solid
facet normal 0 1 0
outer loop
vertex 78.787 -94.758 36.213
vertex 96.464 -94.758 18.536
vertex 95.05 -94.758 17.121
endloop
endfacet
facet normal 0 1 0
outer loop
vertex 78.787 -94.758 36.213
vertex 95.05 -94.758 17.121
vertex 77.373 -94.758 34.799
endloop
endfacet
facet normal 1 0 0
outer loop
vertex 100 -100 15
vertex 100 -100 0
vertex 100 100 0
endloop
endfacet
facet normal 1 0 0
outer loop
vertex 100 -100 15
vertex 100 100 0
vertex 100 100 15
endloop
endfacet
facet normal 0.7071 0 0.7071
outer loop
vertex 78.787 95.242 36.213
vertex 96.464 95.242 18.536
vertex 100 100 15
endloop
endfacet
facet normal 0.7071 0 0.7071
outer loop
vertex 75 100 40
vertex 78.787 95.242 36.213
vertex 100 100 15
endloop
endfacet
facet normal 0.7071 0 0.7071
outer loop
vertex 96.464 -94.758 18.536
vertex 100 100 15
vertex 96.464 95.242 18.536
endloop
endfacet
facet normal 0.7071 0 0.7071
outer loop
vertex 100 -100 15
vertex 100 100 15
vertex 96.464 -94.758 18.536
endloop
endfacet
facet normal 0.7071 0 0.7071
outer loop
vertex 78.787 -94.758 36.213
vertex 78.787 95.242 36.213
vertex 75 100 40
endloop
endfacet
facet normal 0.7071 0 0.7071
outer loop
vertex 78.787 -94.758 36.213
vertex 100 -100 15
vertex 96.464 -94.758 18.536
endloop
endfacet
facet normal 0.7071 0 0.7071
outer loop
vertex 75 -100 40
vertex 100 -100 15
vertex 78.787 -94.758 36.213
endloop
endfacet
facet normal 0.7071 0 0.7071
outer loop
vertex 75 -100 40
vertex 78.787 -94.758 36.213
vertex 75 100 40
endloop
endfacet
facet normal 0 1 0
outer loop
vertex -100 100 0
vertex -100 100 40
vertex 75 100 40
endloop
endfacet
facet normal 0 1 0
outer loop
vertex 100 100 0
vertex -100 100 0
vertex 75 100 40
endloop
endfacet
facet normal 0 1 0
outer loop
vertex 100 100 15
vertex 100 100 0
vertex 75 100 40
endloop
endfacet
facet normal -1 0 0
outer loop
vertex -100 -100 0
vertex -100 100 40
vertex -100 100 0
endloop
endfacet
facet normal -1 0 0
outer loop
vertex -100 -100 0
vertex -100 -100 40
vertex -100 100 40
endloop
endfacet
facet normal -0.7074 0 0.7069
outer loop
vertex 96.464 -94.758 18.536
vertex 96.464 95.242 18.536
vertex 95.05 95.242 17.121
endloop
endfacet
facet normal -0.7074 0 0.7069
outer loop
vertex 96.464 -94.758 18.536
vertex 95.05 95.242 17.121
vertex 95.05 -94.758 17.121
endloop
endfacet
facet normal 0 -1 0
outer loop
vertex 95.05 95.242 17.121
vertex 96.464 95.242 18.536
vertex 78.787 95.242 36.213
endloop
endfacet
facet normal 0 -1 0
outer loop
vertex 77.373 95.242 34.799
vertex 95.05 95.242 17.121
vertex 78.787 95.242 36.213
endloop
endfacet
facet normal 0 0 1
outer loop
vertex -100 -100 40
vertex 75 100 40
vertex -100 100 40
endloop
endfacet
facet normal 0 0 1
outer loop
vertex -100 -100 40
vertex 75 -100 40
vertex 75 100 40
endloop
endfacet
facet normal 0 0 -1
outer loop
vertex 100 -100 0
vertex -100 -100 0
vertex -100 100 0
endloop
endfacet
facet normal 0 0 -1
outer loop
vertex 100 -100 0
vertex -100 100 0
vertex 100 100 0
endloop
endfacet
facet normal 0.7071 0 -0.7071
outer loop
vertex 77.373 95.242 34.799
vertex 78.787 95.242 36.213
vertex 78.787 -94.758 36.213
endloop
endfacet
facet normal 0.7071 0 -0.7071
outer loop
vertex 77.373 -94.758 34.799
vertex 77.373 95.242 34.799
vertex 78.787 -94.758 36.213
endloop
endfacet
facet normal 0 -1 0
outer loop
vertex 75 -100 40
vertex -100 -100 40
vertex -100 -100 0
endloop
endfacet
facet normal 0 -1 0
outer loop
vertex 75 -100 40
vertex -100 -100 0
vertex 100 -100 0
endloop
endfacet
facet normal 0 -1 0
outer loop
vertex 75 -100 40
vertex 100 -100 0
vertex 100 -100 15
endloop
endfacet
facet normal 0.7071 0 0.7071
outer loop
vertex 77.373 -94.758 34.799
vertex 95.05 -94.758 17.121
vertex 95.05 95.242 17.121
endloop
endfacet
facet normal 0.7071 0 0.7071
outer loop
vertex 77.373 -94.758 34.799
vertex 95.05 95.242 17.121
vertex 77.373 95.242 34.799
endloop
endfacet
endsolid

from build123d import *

# Parameters (mm, degrees)
PAD_DEPTH    = 100
SKETCH001_W  = 25
SKETCH001_H  = 190
POCKET_DEPTH = 2


with BuildPart() as part:
    # Sketch → Pad (new body, symmetric)
    with BuildSketch(Plane.XZ):
        Polygon((-100, 40), (-100, 0), (100, 0), (100, 15), (75, 40), align=None)
    extrude(amount=PAD_DEPTH, both=True)

    # Sketch001 (on DatumPlane) → Pocket (cut)
    with BuildSketch(Plane(origin=(100, -100, 15), x_dir=(-0.707107, 0, 0.707107), z_dir=(0.707107, 0, 0.707107))):
        with Locations((17.5, -100.241764)):
            Rectangle(SKETCH001_W, SKETCH001_H)
    extrude(amount=-POCKET_DEPTH, mode=Mode.SUBTRACT)


solid = part.part
